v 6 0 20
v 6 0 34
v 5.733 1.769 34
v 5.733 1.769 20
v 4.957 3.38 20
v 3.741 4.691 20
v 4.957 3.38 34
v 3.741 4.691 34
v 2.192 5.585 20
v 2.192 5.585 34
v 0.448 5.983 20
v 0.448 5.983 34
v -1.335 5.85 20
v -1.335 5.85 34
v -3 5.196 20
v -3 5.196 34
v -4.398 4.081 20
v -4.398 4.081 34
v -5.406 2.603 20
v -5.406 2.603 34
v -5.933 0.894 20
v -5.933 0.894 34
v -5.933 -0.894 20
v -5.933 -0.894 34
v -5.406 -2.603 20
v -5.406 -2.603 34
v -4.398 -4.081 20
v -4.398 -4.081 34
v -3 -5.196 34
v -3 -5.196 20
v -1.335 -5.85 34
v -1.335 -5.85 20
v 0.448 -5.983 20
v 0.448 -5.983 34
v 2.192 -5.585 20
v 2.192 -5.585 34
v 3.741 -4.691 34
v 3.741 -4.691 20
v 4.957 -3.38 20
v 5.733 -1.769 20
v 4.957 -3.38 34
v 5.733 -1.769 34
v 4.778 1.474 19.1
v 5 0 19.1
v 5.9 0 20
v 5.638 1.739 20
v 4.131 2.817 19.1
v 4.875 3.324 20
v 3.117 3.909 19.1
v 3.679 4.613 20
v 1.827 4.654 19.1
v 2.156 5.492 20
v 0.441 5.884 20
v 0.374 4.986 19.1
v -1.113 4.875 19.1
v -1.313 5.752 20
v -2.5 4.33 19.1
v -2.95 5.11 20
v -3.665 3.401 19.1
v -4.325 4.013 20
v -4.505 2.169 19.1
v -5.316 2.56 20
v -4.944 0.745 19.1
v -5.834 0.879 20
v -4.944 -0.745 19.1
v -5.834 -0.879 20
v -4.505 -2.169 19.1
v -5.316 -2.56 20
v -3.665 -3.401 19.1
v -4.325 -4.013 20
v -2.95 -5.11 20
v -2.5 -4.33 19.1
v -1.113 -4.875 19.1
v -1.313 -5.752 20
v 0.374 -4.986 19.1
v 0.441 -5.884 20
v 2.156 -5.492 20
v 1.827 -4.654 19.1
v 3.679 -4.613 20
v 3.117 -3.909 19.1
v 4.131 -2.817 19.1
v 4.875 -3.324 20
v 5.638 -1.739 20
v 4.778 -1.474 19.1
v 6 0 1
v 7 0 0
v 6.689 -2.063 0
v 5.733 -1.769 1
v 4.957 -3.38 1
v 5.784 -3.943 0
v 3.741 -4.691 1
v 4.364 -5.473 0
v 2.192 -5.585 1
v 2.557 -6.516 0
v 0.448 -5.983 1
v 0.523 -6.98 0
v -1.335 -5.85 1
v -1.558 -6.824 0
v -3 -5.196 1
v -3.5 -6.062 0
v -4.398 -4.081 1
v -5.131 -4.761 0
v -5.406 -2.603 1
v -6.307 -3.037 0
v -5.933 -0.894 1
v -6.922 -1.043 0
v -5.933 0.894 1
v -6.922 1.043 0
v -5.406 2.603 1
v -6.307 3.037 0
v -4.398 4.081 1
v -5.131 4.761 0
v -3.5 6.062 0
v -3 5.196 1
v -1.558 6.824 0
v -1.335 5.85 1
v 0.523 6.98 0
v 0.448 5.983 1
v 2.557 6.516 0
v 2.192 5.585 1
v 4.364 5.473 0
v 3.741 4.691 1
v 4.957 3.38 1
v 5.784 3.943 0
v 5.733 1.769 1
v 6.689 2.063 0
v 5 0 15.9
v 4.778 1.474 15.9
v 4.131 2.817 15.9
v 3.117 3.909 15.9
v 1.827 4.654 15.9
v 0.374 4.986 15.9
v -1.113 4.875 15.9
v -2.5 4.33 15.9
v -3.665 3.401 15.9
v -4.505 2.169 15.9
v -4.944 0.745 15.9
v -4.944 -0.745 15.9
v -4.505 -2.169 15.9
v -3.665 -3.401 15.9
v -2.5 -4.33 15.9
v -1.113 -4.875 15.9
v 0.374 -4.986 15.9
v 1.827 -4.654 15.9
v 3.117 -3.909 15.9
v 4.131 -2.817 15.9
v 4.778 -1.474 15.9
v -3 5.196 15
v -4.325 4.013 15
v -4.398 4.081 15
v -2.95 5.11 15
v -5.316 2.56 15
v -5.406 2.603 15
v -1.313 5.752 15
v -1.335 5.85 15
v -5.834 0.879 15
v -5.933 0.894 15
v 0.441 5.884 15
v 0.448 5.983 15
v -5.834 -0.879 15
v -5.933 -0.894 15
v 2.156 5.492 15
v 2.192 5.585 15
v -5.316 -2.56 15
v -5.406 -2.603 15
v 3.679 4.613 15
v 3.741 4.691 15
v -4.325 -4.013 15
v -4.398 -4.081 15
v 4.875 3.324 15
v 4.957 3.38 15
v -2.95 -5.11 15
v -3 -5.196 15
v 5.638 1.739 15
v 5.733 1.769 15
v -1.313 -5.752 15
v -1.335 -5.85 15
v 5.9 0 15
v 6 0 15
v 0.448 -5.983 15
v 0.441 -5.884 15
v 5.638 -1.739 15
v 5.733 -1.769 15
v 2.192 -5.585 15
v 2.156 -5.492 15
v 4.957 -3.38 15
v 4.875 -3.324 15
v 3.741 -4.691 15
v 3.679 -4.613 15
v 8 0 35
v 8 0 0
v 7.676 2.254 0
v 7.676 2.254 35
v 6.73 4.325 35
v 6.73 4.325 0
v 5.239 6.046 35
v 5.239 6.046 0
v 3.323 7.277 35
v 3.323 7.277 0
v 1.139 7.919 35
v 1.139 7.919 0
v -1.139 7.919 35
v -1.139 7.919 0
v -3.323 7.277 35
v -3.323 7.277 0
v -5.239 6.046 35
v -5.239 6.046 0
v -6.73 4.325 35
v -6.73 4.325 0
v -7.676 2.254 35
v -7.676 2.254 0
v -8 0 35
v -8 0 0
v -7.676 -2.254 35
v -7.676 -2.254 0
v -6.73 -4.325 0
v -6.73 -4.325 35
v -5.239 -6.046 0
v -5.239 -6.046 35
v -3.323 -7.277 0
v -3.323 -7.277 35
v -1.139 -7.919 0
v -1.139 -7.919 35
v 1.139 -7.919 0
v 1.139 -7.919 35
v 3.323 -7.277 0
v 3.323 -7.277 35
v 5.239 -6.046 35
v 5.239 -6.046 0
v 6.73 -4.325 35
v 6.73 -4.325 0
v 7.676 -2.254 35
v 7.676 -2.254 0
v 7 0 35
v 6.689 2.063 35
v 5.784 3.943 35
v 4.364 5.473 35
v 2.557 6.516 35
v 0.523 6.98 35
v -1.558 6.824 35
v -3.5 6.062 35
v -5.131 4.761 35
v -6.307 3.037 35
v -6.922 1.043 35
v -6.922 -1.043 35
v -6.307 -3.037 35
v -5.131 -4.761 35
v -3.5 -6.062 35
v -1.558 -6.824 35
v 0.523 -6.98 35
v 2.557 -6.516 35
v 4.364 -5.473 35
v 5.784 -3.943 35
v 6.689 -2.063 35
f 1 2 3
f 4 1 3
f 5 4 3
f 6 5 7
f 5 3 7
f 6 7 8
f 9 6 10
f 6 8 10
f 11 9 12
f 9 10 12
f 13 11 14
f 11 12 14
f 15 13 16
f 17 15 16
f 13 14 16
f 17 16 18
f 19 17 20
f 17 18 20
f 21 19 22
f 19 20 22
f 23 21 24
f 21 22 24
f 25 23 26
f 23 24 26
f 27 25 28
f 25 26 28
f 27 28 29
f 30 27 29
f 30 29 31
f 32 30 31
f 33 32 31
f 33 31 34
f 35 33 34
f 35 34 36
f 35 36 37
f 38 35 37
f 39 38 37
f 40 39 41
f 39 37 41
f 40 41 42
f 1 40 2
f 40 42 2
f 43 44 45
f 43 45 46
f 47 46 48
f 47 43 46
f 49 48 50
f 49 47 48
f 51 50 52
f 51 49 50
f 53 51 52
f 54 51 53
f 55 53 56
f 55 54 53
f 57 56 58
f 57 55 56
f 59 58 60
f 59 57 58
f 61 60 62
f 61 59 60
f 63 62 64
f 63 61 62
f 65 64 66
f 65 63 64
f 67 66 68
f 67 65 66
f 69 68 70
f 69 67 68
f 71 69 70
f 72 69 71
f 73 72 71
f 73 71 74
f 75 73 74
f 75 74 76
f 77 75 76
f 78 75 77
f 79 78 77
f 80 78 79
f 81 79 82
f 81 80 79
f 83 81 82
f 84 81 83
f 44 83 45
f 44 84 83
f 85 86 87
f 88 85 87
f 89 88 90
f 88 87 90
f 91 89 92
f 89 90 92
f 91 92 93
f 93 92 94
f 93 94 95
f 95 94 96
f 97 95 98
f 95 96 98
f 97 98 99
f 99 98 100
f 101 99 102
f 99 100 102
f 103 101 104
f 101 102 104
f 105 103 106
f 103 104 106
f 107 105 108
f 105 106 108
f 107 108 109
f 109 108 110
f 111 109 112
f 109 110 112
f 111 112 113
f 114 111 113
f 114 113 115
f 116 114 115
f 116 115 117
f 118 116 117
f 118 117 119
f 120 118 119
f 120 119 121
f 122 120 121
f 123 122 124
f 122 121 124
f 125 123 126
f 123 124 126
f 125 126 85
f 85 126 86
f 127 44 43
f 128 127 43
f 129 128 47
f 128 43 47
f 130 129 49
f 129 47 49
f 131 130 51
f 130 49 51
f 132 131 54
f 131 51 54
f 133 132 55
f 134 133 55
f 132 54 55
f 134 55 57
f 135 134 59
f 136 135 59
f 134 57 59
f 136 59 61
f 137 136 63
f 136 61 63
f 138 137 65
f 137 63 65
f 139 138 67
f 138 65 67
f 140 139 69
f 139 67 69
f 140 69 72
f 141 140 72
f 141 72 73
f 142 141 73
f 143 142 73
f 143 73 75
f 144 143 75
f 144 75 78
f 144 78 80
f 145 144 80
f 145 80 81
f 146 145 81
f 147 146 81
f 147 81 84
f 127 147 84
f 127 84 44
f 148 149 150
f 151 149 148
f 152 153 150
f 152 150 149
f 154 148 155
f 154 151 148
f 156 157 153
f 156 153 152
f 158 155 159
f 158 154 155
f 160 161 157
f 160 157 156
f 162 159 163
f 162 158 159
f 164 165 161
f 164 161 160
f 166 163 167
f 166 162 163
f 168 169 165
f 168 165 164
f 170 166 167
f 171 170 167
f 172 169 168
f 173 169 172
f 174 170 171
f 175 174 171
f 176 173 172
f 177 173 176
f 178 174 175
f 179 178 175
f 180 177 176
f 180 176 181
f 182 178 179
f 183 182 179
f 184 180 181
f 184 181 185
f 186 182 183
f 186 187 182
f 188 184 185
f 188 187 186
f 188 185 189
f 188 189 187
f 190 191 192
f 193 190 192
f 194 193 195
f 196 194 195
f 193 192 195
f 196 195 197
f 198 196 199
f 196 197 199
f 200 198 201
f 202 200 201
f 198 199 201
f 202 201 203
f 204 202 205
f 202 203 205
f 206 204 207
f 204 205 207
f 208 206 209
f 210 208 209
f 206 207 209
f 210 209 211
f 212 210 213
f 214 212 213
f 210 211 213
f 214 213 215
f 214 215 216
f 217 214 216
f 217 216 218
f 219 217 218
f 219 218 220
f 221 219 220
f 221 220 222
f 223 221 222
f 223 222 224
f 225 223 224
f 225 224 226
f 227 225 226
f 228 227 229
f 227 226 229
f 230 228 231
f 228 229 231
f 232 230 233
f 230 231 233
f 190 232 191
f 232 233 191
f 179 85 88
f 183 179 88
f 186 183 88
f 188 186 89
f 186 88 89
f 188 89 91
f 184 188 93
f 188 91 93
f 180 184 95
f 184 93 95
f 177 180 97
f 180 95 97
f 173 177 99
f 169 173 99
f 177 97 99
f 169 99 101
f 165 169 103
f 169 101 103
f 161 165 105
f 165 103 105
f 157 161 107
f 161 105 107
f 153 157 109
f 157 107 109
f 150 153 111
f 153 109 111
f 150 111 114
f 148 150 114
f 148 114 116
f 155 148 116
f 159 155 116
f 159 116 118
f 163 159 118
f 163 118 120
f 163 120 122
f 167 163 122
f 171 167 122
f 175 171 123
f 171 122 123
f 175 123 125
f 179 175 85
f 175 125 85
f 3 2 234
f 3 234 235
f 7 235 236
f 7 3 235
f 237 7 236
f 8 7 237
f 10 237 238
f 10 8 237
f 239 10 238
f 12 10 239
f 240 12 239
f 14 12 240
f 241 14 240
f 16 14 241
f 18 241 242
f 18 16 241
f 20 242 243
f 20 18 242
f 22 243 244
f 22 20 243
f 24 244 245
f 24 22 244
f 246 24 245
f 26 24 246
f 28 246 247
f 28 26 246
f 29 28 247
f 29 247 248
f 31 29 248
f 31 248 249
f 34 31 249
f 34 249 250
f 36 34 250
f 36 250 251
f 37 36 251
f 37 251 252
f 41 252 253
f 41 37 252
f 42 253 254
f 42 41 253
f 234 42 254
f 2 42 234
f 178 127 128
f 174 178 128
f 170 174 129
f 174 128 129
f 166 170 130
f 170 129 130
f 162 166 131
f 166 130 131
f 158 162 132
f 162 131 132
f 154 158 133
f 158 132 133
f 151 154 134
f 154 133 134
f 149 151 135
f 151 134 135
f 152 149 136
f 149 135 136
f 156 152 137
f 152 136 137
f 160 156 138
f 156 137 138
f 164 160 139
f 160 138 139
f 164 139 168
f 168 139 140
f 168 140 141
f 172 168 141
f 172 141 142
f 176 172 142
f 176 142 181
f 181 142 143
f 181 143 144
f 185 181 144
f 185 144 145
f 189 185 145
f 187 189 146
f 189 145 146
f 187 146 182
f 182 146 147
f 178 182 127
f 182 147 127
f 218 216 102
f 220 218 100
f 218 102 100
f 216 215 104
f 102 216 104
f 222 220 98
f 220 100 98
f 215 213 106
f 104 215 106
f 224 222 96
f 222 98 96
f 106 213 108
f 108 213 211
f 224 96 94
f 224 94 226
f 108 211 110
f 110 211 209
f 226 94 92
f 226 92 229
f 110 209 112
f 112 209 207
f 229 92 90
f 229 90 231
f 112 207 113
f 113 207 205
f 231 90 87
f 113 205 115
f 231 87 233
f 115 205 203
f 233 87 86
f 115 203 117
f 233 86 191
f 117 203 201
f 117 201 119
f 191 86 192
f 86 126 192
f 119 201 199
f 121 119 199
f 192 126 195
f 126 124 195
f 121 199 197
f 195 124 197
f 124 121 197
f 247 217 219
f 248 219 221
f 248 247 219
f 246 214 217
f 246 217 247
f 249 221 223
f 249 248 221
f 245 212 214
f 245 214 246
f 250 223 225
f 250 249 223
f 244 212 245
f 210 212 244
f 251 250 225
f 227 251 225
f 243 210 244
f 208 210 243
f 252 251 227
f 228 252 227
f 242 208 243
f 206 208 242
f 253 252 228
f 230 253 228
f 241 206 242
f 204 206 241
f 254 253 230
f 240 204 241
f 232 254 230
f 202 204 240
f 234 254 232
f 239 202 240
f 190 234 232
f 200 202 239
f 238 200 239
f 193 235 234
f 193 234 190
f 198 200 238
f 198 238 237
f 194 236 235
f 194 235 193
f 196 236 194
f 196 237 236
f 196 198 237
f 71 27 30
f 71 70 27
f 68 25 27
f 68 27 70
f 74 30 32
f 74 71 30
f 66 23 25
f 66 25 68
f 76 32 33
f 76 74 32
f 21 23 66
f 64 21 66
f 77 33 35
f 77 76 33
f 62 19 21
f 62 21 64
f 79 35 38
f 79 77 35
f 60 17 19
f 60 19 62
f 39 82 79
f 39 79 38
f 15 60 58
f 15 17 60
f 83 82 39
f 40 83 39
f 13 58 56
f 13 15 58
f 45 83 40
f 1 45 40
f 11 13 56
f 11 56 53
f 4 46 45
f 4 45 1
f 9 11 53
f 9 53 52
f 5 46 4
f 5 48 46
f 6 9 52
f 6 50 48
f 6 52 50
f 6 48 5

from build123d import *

# Parameters (mm, degrees)
SKETCH_R        = 8
PAD_DEPTH       = 35
SKETCH001_R     = 5
POCKET_DEPTH    = 35.001
SKETCH002_R     = 6
POCKET001_DEPTH = 15
SKETCH003_R     = 6
POCKET002_DEPTH = 15
CHAMFER_SIZE    = 0.9
CHAMFER001_SIZE = 1


with BuildPart() as part:
    # Sketch → Pad (new body)
    with BuildSketch(Plane.XY):
        Circle(SKETCH_R)
    extrude(amount=PAD_DEPTH)

    # Sketch001 (on Face3 of Pad) → Pocket (cut, through all)
    with BuildSketch(Plane.XY.offset(35)):
        Circle(SKETCH001_R)
    extrude(amount=-POCKET_DEPTH, mode=Mode.SUBTRACT)

    # Sketch002 (on Face3 of Pocket) → Pocket001 (cut)
    with BuildSketch(Plane.XY.offset(35)):
        Circle(SKETCH002_R)
    extrude(amount=-POCKET001_DEPTH, mode=Mode.SUBTRACT)

    # Sketch003 (on Face2 of Pocket001) → Pocket002 (cut)
    with BuildSketch(Plane(origin=(0, 0, 0), x_dir=(1, 0, 0), z_dir=(0, 0, -1))):
        Circle(SKETCH003_R)
    extrude(amount=-POCKET002_DEPTH, mode=Mode.SUBTRACT)

    # Chamfer
    chamfer_edges = [part.edges().sort_by_distance(p)[0] for p in [
        (-5, 0, 15),
        (-5, 0, 20),
    ]]
    chamfer(chamfer_edges, length=CHAMFER_SIZE)

    # Chamfer001
    chamfer001_edges = [part.edges().sort_by_distance(p)[0] for p in [
        (-6, 0, 0),
        (-6, 0, 35),
    ]]
    chamfer(chamfer001_edges, length=CHAMFER001_SIZE)


solid = part.part
